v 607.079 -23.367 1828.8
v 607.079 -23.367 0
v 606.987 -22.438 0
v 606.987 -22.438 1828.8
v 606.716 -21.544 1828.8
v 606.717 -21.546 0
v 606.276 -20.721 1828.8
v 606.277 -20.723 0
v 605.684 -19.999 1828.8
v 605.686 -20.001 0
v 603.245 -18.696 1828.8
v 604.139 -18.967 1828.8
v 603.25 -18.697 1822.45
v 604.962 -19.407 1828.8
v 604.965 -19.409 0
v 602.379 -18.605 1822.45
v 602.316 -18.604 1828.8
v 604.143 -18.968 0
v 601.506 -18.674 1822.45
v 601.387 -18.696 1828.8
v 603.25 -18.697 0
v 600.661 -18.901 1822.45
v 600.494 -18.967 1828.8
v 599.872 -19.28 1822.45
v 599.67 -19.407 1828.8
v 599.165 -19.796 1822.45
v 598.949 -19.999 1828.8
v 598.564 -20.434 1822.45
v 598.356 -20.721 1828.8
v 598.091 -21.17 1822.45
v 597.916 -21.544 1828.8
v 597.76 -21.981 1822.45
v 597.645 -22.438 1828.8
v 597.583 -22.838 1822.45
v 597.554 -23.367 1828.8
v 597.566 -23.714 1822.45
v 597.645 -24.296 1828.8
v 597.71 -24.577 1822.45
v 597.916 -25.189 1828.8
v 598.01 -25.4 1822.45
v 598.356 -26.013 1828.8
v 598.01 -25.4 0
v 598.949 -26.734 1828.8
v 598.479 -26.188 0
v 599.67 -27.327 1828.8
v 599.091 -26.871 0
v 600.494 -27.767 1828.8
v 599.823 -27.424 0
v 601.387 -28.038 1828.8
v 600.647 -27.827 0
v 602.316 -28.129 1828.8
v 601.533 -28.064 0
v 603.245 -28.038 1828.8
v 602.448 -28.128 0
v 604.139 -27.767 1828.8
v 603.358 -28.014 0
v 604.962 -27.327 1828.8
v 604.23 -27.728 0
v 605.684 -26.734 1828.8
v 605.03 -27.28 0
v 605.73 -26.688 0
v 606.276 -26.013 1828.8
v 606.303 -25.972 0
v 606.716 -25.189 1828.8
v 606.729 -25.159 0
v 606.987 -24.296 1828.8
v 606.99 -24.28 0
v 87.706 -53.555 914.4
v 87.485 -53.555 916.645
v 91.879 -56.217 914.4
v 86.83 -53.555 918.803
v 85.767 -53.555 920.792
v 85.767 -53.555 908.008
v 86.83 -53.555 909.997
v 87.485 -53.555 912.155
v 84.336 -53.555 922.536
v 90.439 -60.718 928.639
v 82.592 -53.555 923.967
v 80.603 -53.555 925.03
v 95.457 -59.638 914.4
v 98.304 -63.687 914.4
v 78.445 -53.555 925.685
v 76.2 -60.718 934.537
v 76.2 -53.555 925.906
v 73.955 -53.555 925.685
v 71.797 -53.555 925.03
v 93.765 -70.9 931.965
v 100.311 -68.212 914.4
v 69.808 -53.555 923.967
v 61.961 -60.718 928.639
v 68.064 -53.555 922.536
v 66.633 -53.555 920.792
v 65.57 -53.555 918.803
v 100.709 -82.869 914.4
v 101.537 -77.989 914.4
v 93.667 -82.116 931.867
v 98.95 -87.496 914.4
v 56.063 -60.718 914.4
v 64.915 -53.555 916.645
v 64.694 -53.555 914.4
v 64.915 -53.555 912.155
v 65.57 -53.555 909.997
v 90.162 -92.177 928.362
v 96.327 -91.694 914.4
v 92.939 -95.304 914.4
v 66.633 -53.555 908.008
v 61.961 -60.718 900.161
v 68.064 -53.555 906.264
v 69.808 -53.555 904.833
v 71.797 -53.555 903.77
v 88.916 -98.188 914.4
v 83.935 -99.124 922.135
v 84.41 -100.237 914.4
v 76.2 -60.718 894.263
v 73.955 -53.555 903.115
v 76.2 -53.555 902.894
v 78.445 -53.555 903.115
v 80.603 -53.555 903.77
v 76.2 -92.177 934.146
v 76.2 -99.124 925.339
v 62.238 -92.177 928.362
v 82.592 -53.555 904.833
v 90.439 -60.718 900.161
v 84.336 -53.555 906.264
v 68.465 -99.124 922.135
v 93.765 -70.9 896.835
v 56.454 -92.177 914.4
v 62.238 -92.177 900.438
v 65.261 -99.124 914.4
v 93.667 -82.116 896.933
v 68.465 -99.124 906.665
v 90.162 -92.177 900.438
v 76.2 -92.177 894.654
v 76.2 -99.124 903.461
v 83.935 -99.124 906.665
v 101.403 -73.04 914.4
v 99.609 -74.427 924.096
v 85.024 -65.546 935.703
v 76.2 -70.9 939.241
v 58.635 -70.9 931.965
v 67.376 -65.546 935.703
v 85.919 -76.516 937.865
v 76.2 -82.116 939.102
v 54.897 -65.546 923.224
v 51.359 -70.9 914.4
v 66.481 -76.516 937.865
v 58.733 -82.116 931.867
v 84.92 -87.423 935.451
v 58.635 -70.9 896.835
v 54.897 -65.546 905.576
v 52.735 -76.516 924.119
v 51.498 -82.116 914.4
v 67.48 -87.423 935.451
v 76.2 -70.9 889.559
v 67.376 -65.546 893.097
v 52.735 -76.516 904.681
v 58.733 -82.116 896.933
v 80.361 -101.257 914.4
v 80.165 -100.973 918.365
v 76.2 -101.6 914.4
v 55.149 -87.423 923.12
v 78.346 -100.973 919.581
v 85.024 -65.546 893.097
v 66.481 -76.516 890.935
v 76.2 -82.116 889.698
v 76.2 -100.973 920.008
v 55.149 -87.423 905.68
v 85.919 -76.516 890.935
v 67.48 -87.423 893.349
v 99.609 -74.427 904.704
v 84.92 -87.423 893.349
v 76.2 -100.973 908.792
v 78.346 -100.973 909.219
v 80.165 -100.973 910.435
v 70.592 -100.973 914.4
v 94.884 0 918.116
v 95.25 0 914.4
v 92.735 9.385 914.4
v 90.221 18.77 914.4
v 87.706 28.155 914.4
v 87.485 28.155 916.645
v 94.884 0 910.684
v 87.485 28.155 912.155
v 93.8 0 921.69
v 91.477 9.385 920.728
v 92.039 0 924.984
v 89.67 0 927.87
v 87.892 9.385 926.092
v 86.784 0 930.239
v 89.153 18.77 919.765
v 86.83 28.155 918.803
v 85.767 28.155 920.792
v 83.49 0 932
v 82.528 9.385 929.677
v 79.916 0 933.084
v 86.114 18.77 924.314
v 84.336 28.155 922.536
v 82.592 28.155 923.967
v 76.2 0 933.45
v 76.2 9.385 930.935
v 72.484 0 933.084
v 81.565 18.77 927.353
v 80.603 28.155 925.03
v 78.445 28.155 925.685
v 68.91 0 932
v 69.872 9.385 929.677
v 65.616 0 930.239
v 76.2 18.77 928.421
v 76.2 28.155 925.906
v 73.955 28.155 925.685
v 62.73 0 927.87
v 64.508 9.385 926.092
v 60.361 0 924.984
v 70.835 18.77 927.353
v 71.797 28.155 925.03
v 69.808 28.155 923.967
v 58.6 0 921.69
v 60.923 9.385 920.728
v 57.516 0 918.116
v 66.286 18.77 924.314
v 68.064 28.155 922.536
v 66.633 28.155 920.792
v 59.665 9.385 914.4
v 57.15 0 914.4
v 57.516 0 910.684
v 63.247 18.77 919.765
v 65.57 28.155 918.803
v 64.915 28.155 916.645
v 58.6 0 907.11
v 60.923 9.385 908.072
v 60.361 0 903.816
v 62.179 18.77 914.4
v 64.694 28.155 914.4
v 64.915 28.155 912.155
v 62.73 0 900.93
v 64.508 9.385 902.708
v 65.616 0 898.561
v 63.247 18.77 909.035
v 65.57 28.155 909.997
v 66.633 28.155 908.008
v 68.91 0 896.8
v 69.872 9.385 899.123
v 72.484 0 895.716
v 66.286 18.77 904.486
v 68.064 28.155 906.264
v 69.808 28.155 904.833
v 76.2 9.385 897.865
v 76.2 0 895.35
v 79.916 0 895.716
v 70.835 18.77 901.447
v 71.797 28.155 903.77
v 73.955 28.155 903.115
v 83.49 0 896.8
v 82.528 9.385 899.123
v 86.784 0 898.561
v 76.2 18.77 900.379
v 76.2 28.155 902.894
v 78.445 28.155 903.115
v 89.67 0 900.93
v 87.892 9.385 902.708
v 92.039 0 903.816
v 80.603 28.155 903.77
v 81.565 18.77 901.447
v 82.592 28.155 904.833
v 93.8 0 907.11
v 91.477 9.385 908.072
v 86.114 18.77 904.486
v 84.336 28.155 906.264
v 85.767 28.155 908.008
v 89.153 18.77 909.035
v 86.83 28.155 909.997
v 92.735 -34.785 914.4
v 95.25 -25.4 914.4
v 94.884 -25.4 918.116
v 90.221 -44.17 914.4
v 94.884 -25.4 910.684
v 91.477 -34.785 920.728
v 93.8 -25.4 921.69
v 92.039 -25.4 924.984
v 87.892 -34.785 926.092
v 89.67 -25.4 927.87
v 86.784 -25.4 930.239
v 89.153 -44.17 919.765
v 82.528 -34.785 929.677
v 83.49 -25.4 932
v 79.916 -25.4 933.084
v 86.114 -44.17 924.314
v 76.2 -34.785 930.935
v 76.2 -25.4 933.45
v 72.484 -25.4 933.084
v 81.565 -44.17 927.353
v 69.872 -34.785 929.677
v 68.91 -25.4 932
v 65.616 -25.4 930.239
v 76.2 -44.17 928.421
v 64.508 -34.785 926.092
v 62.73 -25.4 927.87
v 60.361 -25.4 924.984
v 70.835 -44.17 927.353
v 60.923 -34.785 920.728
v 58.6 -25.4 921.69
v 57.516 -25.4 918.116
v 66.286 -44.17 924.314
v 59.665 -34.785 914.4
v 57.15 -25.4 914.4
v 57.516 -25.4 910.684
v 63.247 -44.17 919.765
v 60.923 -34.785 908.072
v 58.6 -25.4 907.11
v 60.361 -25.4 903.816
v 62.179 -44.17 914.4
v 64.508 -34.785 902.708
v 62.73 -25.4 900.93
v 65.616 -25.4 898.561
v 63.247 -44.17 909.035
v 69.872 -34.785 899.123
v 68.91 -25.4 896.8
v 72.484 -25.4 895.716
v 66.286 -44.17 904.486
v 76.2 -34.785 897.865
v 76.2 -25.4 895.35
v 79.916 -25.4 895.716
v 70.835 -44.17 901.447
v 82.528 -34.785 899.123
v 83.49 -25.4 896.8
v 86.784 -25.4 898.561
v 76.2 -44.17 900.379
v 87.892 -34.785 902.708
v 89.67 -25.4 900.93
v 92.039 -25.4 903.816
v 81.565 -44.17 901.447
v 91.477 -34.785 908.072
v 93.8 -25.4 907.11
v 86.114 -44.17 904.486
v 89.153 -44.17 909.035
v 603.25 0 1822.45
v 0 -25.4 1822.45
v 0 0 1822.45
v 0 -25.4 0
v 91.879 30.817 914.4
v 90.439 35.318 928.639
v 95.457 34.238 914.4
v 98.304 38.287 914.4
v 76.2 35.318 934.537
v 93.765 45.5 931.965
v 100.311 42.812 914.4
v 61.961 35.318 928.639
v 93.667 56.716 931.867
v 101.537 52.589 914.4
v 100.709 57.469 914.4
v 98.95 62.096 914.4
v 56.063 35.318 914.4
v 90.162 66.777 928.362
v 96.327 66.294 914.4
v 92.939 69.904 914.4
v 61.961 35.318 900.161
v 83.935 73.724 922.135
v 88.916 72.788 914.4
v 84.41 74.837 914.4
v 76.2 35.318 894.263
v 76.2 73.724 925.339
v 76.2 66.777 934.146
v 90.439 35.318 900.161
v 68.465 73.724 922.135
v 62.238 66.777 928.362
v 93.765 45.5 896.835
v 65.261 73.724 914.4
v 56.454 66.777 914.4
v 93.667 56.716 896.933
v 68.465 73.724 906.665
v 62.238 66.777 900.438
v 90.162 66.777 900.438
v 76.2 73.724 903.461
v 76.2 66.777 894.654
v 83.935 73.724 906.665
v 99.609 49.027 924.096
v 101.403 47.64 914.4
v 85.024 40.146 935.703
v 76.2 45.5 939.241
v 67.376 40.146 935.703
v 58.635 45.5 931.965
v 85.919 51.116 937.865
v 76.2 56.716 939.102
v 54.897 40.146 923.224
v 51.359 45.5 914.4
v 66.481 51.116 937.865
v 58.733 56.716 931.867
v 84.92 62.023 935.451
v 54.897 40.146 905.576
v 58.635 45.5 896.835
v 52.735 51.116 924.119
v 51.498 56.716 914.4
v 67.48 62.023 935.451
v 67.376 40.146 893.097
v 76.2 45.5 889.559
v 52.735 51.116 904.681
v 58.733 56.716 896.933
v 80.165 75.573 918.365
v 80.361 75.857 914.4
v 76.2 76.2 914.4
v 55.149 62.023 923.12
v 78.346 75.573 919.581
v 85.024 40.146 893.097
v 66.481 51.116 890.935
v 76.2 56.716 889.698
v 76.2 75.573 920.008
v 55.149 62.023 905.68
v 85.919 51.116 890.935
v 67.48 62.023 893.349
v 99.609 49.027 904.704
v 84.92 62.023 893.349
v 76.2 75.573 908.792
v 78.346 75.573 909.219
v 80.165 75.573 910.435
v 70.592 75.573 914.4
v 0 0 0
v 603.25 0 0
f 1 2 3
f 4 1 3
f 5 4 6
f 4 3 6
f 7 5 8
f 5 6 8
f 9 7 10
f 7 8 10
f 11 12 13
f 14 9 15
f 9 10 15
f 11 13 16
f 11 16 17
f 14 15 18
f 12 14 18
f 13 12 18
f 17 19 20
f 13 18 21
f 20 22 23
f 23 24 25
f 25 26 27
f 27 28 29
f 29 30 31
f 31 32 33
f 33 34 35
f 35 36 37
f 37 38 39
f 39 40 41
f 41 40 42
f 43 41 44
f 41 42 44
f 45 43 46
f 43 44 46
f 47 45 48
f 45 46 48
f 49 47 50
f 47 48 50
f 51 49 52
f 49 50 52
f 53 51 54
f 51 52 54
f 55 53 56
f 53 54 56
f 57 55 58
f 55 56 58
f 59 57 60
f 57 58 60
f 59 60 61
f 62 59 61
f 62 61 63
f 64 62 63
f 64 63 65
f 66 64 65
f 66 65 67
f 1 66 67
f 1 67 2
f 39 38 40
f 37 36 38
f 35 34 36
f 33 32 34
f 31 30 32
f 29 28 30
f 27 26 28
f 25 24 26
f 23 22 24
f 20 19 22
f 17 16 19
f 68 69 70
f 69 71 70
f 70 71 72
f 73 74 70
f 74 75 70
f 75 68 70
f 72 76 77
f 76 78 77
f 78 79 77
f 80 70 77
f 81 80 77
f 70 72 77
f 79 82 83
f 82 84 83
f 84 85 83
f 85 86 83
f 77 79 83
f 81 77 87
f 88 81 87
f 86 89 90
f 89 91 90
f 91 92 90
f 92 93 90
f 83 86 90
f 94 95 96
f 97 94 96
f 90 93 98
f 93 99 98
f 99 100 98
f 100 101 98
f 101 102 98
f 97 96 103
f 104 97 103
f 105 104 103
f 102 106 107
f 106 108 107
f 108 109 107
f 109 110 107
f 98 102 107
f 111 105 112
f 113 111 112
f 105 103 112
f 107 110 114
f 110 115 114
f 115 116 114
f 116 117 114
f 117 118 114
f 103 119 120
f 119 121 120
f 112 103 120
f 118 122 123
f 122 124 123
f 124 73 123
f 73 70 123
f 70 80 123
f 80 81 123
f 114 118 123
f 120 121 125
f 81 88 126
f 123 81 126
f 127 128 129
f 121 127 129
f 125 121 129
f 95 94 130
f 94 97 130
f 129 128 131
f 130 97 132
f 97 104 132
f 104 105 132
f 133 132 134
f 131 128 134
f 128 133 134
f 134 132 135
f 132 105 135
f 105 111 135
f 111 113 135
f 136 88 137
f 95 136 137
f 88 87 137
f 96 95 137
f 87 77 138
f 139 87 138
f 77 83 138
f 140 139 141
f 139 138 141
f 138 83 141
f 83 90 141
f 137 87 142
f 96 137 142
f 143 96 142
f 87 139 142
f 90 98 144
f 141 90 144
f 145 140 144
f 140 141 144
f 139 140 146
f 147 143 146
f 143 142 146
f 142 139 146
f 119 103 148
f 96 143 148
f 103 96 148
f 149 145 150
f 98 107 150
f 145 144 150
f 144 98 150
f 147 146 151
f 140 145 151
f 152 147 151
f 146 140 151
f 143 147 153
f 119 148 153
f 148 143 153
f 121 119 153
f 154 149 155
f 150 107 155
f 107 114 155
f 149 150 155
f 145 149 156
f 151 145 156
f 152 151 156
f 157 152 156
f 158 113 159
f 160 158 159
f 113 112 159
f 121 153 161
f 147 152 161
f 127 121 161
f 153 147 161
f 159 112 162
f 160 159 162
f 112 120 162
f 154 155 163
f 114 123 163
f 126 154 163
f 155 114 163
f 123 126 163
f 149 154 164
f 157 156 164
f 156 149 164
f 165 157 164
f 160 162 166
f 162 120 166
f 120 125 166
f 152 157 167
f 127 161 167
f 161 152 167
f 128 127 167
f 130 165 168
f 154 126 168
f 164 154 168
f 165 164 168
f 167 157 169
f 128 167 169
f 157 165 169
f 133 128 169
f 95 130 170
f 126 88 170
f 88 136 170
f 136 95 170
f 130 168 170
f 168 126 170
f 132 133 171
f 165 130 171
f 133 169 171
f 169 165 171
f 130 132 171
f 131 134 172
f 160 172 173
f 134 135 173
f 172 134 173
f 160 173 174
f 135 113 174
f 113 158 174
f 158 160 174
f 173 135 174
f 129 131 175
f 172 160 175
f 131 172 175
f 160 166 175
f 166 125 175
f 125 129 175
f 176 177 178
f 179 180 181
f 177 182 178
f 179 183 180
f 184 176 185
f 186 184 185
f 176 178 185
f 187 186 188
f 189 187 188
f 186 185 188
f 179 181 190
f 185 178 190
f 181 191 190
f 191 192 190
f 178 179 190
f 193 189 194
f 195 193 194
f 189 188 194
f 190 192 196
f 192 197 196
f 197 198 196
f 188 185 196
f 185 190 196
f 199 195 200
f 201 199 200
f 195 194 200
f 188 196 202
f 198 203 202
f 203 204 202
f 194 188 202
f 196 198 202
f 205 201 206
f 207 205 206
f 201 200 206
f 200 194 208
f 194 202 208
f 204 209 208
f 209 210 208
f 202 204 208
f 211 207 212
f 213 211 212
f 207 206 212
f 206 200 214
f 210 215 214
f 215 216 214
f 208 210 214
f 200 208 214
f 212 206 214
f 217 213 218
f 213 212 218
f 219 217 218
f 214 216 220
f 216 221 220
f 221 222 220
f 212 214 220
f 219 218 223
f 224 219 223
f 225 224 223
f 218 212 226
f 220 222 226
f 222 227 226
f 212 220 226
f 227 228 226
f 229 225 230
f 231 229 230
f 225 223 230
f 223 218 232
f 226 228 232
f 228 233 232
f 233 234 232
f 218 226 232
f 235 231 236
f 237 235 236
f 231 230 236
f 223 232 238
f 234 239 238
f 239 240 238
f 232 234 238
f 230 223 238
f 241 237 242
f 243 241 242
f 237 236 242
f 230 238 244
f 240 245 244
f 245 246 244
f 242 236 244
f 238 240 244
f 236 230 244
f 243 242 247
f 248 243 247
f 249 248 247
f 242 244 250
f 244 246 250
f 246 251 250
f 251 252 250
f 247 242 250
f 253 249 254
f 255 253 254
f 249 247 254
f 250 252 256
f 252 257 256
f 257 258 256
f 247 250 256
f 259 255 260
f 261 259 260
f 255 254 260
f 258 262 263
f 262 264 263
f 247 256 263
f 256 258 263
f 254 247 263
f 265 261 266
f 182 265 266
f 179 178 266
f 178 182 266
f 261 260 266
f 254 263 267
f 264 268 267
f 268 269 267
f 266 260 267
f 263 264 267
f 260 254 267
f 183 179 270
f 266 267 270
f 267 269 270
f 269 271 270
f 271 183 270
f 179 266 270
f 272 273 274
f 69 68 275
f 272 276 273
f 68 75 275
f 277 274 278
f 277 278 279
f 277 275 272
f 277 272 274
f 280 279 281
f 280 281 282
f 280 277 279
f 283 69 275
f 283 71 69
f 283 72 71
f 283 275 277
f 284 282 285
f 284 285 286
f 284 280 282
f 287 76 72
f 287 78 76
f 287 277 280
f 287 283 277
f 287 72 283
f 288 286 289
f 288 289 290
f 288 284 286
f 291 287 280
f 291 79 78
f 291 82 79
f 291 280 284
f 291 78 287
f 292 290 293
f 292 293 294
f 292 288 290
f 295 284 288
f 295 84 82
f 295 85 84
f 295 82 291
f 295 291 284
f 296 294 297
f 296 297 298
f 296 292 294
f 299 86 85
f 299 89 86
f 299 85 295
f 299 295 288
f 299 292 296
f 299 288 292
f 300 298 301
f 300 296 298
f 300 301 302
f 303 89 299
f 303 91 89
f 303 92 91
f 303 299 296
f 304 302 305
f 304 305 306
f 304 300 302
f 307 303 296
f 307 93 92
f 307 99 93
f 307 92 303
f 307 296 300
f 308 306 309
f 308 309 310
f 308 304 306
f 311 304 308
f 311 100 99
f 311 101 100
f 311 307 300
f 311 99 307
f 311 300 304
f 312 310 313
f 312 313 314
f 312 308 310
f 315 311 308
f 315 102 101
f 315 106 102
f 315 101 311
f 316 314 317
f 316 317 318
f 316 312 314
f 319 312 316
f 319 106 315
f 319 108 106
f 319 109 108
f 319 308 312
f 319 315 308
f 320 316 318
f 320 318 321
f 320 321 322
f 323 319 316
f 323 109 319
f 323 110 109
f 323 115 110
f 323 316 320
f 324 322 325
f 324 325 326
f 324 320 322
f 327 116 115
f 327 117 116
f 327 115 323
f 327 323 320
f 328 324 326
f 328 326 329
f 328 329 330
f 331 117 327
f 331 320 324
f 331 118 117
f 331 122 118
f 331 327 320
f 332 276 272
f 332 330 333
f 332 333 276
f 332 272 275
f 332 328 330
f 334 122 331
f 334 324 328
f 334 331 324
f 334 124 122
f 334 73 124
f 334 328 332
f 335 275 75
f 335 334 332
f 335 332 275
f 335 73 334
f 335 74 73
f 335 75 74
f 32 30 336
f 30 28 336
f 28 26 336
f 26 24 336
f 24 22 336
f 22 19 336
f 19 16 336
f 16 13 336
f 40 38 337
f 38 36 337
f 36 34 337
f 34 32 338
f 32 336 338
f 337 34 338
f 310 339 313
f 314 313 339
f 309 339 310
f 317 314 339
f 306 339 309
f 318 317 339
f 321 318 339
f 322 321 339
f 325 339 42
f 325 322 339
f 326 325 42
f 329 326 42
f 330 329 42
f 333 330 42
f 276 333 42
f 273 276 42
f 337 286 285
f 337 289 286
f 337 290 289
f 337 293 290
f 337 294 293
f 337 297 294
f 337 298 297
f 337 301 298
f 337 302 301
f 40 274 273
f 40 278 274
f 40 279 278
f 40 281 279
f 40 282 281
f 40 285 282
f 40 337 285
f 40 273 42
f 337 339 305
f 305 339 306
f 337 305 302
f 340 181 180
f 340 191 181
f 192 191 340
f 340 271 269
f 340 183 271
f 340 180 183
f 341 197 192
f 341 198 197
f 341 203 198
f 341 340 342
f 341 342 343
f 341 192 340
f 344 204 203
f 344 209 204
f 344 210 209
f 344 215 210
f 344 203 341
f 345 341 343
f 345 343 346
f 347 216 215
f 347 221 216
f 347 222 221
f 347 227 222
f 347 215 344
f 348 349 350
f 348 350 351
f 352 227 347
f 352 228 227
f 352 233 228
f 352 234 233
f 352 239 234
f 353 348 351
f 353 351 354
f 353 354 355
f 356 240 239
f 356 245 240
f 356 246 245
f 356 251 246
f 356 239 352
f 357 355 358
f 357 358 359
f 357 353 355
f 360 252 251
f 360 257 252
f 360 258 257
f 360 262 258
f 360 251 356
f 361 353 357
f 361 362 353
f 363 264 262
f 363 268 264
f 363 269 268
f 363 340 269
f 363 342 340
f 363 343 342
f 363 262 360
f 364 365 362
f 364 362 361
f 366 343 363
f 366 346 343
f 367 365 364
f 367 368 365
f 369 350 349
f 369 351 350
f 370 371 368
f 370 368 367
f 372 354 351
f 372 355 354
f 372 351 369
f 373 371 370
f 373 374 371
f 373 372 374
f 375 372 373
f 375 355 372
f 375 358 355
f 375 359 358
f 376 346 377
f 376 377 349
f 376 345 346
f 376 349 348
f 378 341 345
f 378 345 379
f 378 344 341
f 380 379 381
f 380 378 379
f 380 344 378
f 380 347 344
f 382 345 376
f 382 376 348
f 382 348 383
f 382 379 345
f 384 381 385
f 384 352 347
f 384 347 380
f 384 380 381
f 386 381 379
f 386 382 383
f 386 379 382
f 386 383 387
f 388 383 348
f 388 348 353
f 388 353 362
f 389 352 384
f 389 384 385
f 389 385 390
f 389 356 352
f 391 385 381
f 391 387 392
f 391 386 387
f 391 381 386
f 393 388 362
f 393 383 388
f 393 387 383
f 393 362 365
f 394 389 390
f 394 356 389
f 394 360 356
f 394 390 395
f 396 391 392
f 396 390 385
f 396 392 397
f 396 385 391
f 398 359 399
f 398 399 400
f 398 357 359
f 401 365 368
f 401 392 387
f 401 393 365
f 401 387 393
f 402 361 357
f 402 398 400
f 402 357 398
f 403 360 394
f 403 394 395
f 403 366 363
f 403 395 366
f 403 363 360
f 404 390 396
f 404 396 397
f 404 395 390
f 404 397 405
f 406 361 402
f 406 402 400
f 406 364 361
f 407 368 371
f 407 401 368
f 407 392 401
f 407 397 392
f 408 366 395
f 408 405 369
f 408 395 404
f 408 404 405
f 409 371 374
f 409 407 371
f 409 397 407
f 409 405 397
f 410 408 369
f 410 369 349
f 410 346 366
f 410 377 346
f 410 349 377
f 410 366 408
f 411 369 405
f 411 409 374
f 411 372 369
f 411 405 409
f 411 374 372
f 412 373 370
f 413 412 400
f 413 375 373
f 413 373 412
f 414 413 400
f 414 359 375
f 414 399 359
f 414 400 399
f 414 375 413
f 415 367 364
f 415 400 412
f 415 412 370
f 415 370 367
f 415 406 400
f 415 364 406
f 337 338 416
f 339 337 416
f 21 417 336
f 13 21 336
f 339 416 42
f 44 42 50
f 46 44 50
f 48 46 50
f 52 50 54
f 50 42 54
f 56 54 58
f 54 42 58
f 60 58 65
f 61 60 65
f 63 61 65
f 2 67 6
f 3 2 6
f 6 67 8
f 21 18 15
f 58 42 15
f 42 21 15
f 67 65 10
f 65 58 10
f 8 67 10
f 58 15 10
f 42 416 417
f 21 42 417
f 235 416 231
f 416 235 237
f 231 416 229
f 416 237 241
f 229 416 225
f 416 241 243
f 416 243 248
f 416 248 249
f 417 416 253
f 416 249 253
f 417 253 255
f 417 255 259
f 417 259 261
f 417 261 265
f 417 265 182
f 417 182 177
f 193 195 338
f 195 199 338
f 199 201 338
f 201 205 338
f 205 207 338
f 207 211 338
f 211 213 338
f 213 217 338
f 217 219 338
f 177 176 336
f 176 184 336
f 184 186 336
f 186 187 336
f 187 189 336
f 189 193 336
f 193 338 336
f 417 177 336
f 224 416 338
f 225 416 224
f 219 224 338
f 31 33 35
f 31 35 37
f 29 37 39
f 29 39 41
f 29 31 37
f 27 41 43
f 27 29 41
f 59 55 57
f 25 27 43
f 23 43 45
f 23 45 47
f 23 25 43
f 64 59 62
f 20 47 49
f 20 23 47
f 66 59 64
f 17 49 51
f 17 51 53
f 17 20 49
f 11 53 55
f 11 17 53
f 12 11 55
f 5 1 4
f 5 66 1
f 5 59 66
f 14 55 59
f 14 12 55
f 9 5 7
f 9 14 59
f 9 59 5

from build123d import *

# Parameters (mm, degrees)
F1_DEPTH = 25.4
F8_R     = 4.7625
F9_DEPTH = 1828.8


with BuildPart() as f1:
    # F0 (on Front) → F1 (new body)
    with BuildSketch(Plane.XZ):
        Polygon((0, 914.4), (0, 0), (603.25, 0), (603.25, 1822.45), (0, 1822.45), align=None)
    extrude(amount=F1_DEPTH)

    # F5: sweep along a path in F4
    with BuildLine(Plane.XZ.offset(25.4)) as f5_path:
        CenterArc((76.2, 914.4), 21.6276719324, 0, 360)
    # F3 (on offset) → F5 (sweep)
    with BuildSketch(Plane.XY.offset(914.4)):
        with BuildLine():
            Line((57.15, -25.4), (64.6942216848, -53.5554186313))
            ThreePointArc((64.6942216848, -53.5554186313), (51.4984578744, -82.1155571689), (76.2, -101.6))
            Line((76.2, -101.6), (76.2, -25.4))
            Line((76.2, -25.4), (57.15, -25.4))
        make_face()
    sweep(path=f5_path.line)

    # F7: F1 across plane


with BuildPart() as f1_1:
    add(f1.part)
    add(f1.part.mirror(Plane.XZ.offset(12.7)))

    # F8 (on Top) → F9 (join)
    with BuildSketch(Plane.XY):
        with Locations((602.3163199425, -23.3668256551)):
            Circle(F8_R)
    extrude(amount=F9_DEPTH)


solid = f1_1.part
